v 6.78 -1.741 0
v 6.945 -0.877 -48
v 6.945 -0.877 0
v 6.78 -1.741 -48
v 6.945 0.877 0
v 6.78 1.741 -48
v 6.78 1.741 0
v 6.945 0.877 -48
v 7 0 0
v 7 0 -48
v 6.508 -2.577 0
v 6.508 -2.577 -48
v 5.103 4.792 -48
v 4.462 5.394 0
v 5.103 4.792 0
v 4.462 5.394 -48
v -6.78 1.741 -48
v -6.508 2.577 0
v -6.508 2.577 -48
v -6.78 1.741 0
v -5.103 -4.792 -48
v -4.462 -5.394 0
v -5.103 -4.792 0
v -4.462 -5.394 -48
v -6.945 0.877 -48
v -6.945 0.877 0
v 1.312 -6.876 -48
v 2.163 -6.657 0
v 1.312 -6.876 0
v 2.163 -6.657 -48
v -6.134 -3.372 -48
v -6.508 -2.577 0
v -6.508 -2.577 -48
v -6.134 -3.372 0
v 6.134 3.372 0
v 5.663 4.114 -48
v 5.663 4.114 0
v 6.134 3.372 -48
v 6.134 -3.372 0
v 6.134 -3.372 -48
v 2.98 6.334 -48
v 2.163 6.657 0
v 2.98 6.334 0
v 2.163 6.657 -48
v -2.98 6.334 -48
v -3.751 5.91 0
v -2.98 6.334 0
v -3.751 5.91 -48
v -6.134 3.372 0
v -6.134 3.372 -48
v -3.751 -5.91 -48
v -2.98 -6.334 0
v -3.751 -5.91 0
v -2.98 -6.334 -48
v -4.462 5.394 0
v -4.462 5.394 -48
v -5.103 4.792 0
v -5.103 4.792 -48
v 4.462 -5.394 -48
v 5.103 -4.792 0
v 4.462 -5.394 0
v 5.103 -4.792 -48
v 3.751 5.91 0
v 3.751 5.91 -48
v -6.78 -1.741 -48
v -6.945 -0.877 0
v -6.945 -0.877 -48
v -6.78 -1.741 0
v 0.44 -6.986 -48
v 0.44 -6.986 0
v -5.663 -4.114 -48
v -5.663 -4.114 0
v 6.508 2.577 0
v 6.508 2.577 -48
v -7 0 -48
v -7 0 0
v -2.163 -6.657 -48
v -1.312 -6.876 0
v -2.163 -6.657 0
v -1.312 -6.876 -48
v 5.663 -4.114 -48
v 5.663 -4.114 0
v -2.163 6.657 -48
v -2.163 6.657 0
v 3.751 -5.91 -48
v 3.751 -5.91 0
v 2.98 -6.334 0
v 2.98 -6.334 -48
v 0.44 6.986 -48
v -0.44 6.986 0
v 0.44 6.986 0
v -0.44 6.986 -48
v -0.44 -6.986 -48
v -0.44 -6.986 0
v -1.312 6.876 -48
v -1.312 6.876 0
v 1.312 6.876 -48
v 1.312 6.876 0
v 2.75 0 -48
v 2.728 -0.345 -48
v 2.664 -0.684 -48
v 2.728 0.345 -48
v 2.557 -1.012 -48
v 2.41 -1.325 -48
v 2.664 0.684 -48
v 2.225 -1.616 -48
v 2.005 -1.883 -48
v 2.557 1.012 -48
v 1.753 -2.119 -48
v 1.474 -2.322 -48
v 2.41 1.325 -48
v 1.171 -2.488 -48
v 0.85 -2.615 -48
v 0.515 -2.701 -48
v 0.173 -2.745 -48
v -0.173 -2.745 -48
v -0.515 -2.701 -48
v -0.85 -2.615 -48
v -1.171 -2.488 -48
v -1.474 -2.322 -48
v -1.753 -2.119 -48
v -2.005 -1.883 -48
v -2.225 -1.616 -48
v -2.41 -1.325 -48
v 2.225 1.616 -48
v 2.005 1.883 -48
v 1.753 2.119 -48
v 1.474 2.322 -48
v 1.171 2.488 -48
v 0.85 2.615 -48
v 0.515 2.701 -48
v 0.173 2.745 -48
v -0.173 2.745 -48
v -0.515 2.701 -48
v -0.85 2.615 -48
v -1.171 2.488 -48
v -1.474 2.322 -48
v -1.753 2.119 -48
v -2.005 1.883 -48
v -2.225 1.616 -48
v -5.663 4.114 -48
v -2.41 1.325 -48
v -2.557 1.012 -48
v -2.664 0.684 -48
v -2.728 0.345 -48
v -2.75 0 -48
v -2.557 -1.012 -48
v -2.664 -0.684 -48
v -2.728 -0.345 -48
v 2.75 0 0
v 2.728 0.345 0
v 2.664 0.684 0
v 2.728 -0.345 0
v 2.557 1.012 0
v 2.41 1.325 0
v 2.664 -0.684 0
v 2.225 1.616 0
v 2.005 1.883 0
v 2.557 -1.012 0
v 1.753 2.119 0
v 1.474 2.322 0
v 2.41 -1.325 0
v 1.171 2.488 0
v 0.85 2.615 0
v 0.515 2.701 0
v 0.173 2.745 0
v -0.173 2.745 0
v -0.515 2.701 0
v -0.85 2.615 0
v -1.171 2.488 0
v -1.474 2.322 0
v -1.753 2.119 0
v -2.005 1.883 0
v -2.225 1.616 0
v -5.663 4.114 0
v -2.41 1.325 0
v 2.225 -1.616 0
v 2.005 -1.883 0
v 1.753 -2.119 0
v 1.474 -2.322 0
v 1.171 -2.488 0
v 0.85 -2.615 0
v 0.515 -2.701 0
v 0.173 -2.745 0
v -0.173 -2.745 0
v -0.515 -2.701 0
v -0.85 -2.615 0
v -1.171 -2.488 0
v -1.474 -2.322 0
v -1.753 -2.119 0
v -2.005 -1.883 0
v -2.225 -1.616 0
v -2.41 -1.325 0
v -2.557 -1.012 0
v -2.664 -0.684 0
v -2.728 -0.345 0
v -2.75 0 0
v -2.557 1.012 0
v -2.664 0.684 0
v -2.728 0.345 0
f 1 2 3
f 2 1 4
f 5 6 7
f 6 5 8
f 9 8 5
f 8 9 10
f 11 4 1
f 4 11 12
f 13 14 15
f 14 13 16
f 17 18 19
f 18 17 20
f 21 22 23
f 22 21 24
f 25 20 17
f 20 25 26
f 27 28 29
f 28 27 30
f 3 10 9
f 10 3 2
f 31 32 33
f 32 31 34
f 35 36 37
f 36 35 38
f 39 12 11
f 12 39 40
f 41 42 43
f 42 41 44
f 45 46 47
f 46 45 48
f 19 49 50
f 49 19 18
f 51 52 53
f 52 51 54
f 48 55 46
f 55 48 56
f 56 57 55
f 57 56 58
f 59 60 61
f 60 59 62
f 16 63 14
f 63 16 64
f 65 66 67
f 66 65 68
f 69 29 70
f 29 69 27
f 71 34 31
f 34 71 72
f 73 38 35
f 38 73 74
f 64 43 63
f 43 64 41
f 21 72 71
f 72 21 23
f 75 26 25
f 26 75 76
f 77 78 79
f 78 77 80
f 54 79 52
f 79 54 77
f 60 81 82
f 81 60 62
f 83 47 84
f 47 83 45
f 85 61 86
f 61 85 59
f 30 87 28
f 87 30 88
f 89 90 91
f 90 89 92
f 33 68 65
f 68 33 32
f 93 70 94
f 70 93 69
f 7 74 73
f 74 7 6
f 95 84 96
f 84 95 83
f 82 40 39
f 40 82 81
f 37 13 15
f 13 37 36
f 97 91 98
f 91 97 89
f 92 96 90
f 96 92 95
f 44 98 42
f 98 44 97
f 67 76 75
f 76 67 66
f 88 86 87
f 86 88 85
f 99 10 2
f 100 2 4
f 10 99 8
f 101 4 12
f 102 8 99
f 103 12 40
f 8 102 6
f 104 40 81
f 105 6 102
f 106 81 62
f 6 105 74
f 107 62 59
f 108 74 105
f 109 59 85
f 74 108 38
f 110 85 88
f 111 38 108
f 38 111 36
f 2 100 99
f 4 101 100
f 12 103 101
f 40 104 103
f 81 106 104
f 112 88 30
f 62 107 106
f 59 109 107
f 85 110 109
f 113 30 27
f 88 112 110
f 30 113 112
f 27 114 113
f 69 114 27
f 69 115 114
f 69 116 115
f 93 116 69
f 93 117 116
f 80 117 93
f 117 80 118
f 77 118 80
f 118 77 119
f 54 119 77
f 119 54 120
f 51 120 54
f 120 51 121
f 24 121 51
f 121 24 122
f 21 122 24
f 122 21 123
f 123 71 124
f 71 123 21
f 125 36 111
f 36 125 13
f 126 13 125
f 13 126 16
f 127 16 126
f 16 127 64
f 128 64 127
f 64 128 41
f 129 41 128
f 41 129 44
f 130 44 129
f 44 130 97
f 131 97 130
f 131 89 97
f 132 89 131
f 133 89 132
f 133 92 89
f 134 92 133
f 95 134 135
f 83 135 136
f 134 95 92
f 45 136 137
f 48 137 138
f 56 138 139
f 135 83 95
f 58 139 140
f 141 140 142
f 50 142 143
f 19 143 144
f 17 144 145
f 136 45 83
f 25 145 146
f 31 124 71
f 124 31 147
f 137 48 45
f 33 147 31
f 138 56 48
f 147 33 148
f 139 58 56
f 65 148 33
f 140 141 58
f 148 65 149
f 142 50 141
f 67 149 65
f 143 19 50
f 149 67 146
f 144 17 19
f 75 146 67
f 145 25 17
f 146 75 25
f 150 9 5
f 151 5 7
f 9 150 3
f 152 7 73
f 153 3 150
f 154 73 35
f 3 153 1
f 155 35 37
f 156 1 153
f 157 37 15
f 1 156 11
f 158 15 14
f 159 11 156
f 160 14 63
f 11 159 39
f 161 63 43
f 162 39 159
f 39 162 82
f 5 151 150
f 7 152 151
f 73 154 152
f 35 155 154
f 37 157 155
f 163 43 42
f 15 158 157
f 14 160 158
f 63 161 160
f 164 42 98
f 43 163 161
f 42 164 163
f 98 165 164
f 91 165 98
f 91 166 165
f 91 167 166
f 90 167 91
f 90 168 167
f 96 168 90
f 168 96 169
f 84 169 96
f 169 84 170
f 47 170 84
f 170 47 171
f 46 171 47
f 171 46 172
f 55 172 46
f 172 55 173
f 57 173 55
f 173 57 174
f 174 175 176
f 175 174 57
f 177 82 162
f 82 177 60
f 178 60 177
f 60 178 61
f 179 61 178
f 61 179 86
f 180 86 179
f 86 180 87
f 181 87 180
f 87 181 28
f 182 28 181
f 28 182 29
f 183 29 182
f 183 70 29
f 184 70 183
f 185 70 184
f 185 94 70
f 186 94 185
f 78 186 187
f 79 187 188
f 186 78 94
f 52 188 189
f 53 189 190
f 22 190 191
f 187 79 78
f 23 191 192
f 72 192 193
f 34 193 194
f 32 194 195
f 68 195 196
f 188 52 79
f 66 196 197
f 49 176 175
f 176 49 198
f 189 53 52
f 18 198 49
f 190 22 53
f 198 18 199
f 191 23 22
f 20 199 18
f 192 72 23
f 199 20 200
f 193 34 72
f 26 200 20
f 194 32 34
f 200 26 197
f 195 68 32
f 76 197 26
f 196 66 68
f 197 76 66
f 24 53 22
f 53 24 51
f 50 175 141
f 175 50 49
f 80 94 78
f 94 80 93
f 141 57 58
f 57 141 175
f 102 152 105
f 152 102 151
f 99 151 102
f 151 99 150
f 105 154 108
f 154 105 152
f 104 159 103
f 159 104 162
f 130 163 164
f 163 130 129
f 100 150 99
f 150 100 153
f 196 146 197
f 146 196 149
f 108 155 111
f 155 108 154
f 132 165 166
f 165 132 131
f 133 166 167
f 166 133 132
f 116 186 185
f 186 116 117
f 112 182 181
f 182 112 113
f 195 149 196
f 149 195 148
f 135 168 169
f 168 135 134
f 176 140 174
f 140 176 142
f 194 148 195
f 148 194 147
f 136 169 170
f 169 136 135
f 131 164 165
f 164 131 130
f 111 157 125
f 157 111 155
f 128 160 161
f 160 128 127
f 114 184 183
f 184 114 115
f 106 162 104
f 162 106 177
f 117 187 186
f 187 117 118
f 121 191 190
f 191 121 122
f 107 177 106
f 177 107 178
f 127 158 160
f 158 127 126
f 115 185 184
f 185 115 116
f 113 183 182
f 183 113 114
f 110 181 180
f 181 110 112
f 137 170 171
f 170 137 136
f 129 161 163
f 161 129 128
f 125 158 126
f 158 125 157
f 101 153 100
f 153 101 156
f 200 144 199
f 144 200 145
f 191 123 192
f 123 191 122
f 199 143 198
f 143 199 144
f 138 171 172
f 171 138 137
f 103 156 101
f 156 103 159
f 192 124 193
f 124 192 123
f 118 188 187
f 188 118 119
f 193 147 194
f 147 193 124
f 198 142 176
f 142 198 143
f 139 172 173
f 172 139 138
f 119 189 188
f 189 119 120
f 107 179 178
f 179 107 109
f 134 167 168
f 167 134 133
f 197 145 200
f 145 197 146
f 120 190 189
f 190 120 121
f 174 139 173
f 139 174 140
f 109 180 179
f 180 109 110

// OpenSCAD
$fn = 50;


difference() {
	union() {
		translate(v = [0, 0, -48.0000000000]) {
			cylinder(h = 48, r = 7.0000000000);
		}
	}
	union() {
		#translate(v = [0, 0, -48]) {
			cylinder(h = 48, r = 2.7500000000);
		}
	}
}
